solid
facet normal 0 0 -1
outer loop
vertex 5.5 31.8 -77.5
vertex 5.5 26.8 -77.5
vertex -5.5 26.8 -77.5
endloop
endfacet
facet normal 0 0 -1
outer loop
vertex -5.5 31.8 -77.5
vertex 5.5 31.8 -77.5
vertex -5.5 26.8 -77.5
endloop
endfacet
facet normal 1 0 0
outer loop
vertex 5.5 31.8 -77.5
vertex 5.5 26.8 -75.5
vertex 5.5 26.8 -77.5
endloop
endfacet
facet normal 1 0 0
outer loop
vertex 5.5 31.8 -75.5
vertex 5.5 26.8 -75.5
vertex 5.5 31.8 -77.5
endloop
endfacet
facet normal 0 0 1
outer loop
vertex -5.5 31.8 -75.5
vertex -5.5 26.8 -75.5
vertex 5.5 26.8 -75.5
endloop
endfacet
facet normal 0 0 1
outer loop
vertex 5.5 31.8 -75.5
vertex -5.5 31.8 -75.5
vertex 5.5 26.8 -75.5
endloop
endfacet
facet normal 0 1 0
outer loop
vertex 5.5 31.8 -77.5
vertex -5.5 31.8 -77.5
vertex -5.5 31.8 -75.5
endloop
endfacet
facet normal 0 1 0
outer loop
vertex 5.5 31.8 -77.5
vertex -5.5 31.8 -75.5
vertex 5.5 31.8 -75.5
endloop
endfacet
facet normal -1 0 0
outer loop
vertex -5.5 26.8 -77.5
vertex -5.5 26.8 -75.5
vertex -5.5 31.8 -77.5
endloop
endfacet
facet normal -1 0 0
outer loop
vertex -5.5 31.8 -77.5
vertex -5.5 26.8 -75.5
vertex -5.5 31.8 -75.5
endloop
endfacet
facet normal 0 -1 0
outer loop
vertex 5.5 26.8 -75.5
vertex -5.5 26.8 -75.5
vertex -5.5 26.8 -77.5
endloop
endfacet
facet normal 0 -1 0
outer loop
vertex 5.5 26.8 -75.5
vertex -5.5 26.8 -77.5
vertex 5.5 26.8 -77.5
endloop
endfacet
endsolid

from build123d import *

# Parameters (mm, degrees)
SKETCH1_W                       = 39
SKETCH1_H                       = 155
BOSS_EXTRUDE1_DEPTH             = 2
BOSS_EXTRUDE2_DEPTH             = 38
SKETCH3_W                       = 2
SKETCH3_H                       = 2
BOSS_EXTRUDE3_DEPTH             = 38
SKETCH4_W                       = 2
SKETCH4_H                       = 2
BOSS_EXTRUDE4_DEPTH             = 151
SKETCH6_W                       = 35
SKETCH6_H                       = 2.2
CUT_EXTRUDE1_DEPTH              = 160.340045186
SKETCH7_W                       = 35
SKETCH7_H                       = 2.2
CUT_EXTRUDE2_DEPTH              = 89.490112442
SKETCH5_W                       = 31
SKETCH5_H                       = 2
BOSS_EXTRUDE5_DEPTH             = 2
BOSS_EXTRUDE6_REACH             = 91.367
SKETCH8_W                       = 2
SKETCH8_H                       = 2
BOSS_EXTRUDE6_DIRECTION_2_REACH = 91.367
SKETCH10_W                      = 2
SKETCH10_H                      = 2.2
SKETCH10_W_2                    = 2.2
SKETCH10_H_2                    = 2
BOSS_EXTRUDE8_DEPTH             = 2
SKETCH11_W                      = 2
SKETCH11_H                      = 2.2
SKETCH11_W_2                    = 2.2
SKETCH11_H_2                    = 2
BOSS_EXTRUDE9_DEPTH             = 2
FILLET2_R                       = 2.5
SKETCH14_W                      = 36.5
SKETCH14_H                      = 7.75
BOSS_EXTRUDE10_DEPTH            = 2
SKETCH13_W                      = 31
SKETCH13_H                      = 3
CUT_EXTRUDE4_DEPTH              = 2
FILLET3_R                       = 2
FILLET4_R                       = 0.5
SKETCH15_R                      = 5.1
CUT_EXTRUDE5_DEPTH              = 90.367219941
SKETCH16_R                      = 7.1
BOSS_EXTRUDE11_DEPTH            = 1
FILLET5_R                       = 0.5
FILLET7_R                       = 0.5
CUT_EXTRUDE6_DEPTH              = 6
SKETCH18_W                      = 29
SKETCH18_H                      = 3
CUT_EXTRUDE8_DEPTH              = 90.367219986
CUT_EXTRUDE11_DEPTH             = 90.367219986
CUT_EXTRUDE11_DEPTH_BACK        = 90.367219986
SKETCH20_W                      = 5
SKETCH20_H                      = 40
SKETCH21_W                      = 9
SKETCH21_H                      = 31
CUT_EXTRUDE12_DEPTH             = 89.41097217
CUT_EXTRUDE13_DEPTH             = 41.425858061
CUT_EXTRUDE13_DEPTH_BACK        = 41.425858061
SKETCH22_W                      = 11
SKETCH22_H                      = 8.2
SKETCH23_W                      = 11
SKETCH23_H                      = 17.8
CUT_EXTRUDE14_DEPTH             = 33.334037793


with BuildPart() as part:
    # Sketch1 → Boss-Extrude1 (new body)
    with BuildSketch(Plane(origin=(0, 0, 0), x_dir=(1, 0, 0), z_dir=(0, 1, 0))):
        Rectangle(SKETCH1_W, SKETCH1_H)
    extrude(amount=BOSS_EXTRUDE1_DEPTH)

    # Sketch2 → Boss-Extrude2 (add)
    with BuildSketch(Plane(origin=(0, 2, 0), x_dir=(1, 0, 0), z_dir=(0, 1, 0))):
        Polygon((-17.5, -77.5), (-17.5, -75.5), (-17.5, 75.5), (17.5, 75.5), (17.5, -75.5), (17.5, -77.5), (19.5, -77.5), (19.5, 77.5), (-19.5, 77.5), (-19.5, -77.5), align=None)
    extrude(amount=BOSS_EXTRUDE2_DEPTH)

    # Sketch3 → Boss-Extrude3 (add)
    with BuildSketch(Plane(origin=(0, 2, 0), x_dir=(1, 0, 0), z_dir=(0, 1, 0))):
        with Locations((-16.5, -76.5)):
            Rectangle(SKETCH3_W, SKETCH3_H)
        with Locations((-16.5, -72.3)):
            Rectangle(SKETCH3_W, SKETCH3_H)
        with Locations((16.5, -76.5)):
            Rectangle(SKETCH3_W, SKETCH3_H)
        with Locations((16.5, -72.3)):
            Rectangle(SKETCH3_W, SKETCH3_H)
    extrude(amount=BOSS_EXTRUDE3_DEPTH)

    # Sketch4 → Boss-Extrude4 (add)
    with BuildSketch(Plane.XY.offset(-75.5)):
        with Locations((-16.5, 39)):
            Rectangle(SKETCH4_W, SKETCH4_H)
        Polygon((-15.5, 33.8), (-17.5, 31.8), (-17.5, 35.8), (-15.5, 35.8), align=None)
        Polygon((15.5, 35.8), (17.5, 35.8), (17.5, 31.8), (15.5, 33.8), align=None)
        with Locations((16.5, 39)):
            Rectangle(SKETCH4_W, SKETCH4_H)
    extrude(amount=BOSS_EXTRUDE4_DEPTH)

    # Sketch6 → Cut-Extrude1 (cut, through all)
    with BuildSketch(Plane.XY.offset(-75.5)):
        with Locations((0, 36.9)):
            Rectangle(SKETCH6_W, SKETCH6_H)
    extrude(amount=CUT_EXTRUDE1_DEPTH, mode=Mode.SUBTRACT)

    # Sketch7 → Cut-Extrude2 (cut, through all)
    with BuildSketch(Plane(origin=(0, 2, 0), x_dir=(1, 0, 0), z_dir=(0, 1, 0))):
        with Locations((0, -74.4)):
            Rectangle(SKETCH7_W, SKETCH7_H)
    extrude(amount=CUT_EXTRUDE2_DEPTH, mode=Mode.SUBTRACT)

    # Sketch5 → Boss-Extrude5 (add)
    with BuildSketch(Plane(origin=(0, 2, 0), x_dir=(1, 0, 0), z_dir=(0, 1, 0))):
        with Locations((0, -76.5)):
            Rectangle(SKETCH5_W, SKETCH5_H)
        with Locations((0, -72.3)):
            Rectangle(SKETCH5_W, SKETCH5_H)
    extrude(amount=BOSS_EXTRUDE5_DEPTH)

    # Boss-Extrude6: up to this face of the body (flat: up to its plane)
    boss_extrude6_end = Plane(part.part.faces().sort_by_distance((17.5, 16.9, -2.1))[0])
    # Sketch8 → Boss-Extrude6 (add, up to the picked face)
    with BuildSketch(Plane(origin=(0, 0, 0), x_dir=(0, 0, -1), z_dir=(1, 0, 0)), mode=Mode.PRIVATE) as boss_extrude6_sk1:
        with Locations((74.5, 39)):
            Rectangle(SKETCH8_W, SKETCH8_H)
    boss_extrude6_tool1 = split(extrude(boss_extrude6_sk1.sketch, amount=BOSS_EXTRUDE6_REACH, mode=Mode.PRIVATE), bisect_by=boss_extrude6_end, keep=Keep.BOTH, mode=Mode.PRIVATE)
    # Sketch8 → Boss-Extrude6 (add, up to the picked face)
    with BuildSketch(Plane(origin=(0, 0, 0), x_dir=(0, 0, -1), z_dir=(1, 0, 0)), mode=Mode.PRIVATE) as boss_extrude6_sk2:
        Polygon((75.5, 35.8), (73.5, 35.8), (73.5, 33.8), (75.5, 31.8), align=None)
    boss_extrude6_tool2 = split(extrude(boss_extrude6_sk2.sketch, amount=BOSS_EXTRUDE6_REACH, mode=Mode.PRIVATE), bisect_by=boss_extrude6_end, keep=Keep.BOTH, mode=Mode.PRIVATE)
    add(boss_extrude6_tool1.solids().sort_by(Axis((0, 39, -74.5), (1, 0, 0)))[0])
    add(boss_extrude6_tool2.solids().sort_by(Axis((0, 34.244444, -74.611111), (1, 0, 0)))[0])

    # Boss-Extrude6 direction 2: up to this face of the body (flat: up to its plane)
    boss_extrude6_direction_2_end = Plane(part.part.faces().sort_by_distance((-17.5, 16.9, -2.1))[0])
    # Sketch8 → Boss-Extrude6 direction 2 (add, up to the picked face)
    with BuildSketch(Plane(origin=(0, 0, 0), x_dir=(0, 0, -1), z_dir=(1, 0, 0)), mode=Mode.PRIVATE) as boss_extrude6_direction_2_sk1:
        with Locations((74.5, 39)):
            Rectangle(SKETCH8_W, SKETCH8_H)
    boss_extrude6_direction_2_tool1 = split(extrude(boss_extrude6_direction_2_sk1.sketch, amount=-BOSS_EXTRUDE6_DIRECTION_2_REACH, mode=Mode.PRIVATE), bisect_by=boss_extrude6_direction_2_end, keep=Keep.BOTH, mode=Mode.PRIVATE)
    # Sketch8 → Boss-Extrude6 direction 2 (add, up to the picked face)
    with BuildSketch(Plane(origin=(0, 0, 0), x_dir=(0, 0, -1), z_dir=(1, 0, 0)), mode=Mode.PRIVATE) as boss_extrude6_direction_2_sk2:
        Polygon((75.5, 35.8), (73.5, 35.8), (73.5, 33.8), (75.5, 31.8), align=None)
    boss_extrude6_direction_2_tool2 = split(extrude(boss_extrude6_direction_2_sk2.sketch, amount=-BOSS_EXTRUDE6_DIRECTION_2_REACH, mode=Mode.PRIVATE), bisect_by=boss_extrude6_direction_2_end, keep=Keep.BOTH, mode=Mode.PRIVATE)
    add(boss_extrude6_direction_2_tool1.solids().sort_by(Axis((0, 39, -74.5), (-1, 0, 0)))[0])
    add(boss_extrude6_direction_2_tool2.solids().sort_by(Axis((0, 34.244444, -74.611111), (-1, 0, 0)))[0])

    # Sketch10 → Boss-Extrude8 (add)
    with BuildSketch(Plane(origin=(-17.5, 0, 0), x_dir=(0, 0, -1), z_dir=(1, 0, 0))):
        with Locations((-76.5, 36.9)):
            Rectangle(SKETCH10_W, SKETCH10_H)
        with Locations((-74.4, 39)):
            Rectangle(SKETCH10_W_2, SKETCH10_H_2)
    extrude(amount=BOSS_EXTRUDE8_DEPTH)

    # Sketch11 → Boss-Extrude9 (add)
    with BuildSketch(Plane.ZY.offset(-17.5)):
        with Locations((76.5, 36.9)):
            Rectangle(SKETCH11_W, SKETCH11_H)
        with Locations((74.4, 39)):
            Rectangle(SKETCH11_W_2, SKETCH11_H_2)
    extrude(amount=BOSS_EXTRUDE9_DEPTH)

    # Fillet2
    fillet2_edges = [part.edges().sort_by_distance(p)[0] for p in [
        (-17.5, 16.9, 71.3),
        (17.5, 16.9, 71.3),
        (19.5, 20, 77.5),
        (-19.5, 20, 77.5),
        (-19.5, 20, -77.5),
        (-17.5, 16.9, -75.5),
        (17.5, 16.9, -75.5),
        (19.5, 20, -77.5),
        (19.5, 40, 0),
        (-19.5, 40, 0),
        (19.5, 0, 0),
        (-19.5, 0, 0),
        (0, 40, -77.5),
        (0, 0, 77.5),
        (0, 0, -77.5),
        (-17.5, 40, 77.5),
        (17.5, 40, 77.5),
    ]]
    fillet(fillet2_edges, radius=FILLET2_R)

    # Sketch14 → Boss-Extrude10 (add)
    with BuildSketch(Plane.XY.offset(-75.5)):
        with Locations((0, 5.125)):
            Rectangle(SKETCH14_W, SKETCH14_H)
    extrude(amount=BOSS_EXTRUDE10_DEPTH)

    # Sketch13 → Cut-Extrude4 (cut)
    with BuildSketch(Plane(origin=(0, 0, -77.5), x_dir=(-1, 0, 0), z_dir=(0, 0, -1))):
        with Locations((0, 5.5)):
            Rectangle(SKETCH13_W, SKETCH13_H)
    extrude(amount=-CUT_EXTRUDE4_DEPTH, mode=Mode.SUBTRACT)

    # Fillet3
    fillet3_edges = [part.edges().sort_by_distance(p)[0] for p in [
        (0, 9, -73.5),
    ]]
    fillet(fillet3_edges, radius=FILLET3_R - 0.0001)  # a hair under: the kernel refuses the full size

    # Fillet4
    fillet4_edges = [part.edges().sort_by_distance(p)[0] for p in [
        (15.5, 5.5, -75.5),
        (15.5, 4, -76.5),
        (0, 7, -75.5),
        (15.5, 7, -76.5),
        (-15.5, 5.5, -75.5),
        (-15.5, 7, -76.5),
        (0, 4, -75.5),
        (-15.5, 4, -76.5),
        (15.5, 5.5, -77.5),
        (0, 4, -77.5),
        (-15.5, 5.5, -77.5),
        (0, 7, -77.5),
    ]]
    fillet(fillet4_edges, radius=FILLET4_R)

    # Sketch15 → Cut-Extrude5 (cut, through all)
    with BuildSketch(Plane.XZ):
        with Locations(Location((0, 38.75, 0), (0, 0, 270))):
            Circle(SKETCH15_R)
        with Locations(Location((0, -38.75, 0), (0, 0, 270))):
            Circle(SKETCH15_R)
    extrude(amount=-CUT_EXTRUDE5_DEPTH, mode=Mode.SUBTRACT)

    # Sketch16 → Boss-Extrude11 (add)
    with BuildSketch(Plane(origin=(0, 2, 0), x_dir=(1, 0, 0), z_dir=(0, 1, 0))):
        with Locations(Location((0, 38.75, 0), (0, 0, 270))):
            Circle(SKETCH16_R)
        with Locations(Location((0, -38.75, 0), (0, 0, 270))):
            Circle(SKETCH16_R)
    extrude(amount=BOSS_EXTRUDE11_DEPTH)

    # Fillet5
    fillet5_edges = [part.edges().sort_by_distance(p)[0] for p in [
        (0, 2, -45.85),
        (0, 3, -45.85),
        (0, 2, 31.65),
        (0, 3, 31.65),
    ]]
    fillet(fillet5_edges, radius=FILLET5_R - 0.0001)  # a hair under: the kernel refuses the full size

    # Fillet7
    fillet7_edges = [part.edges().sort_by_distance(p)[0] for p in [
        (15.5, 40, 0.75),
        (0, 4, 77.5),
        (0, 40, -73.5),
        (-15.5, 40, 0.75),
        (-15.5, 20.75, 77.5),
        (-15.5, 39.267766953, 76.767766953),
        (15.5, 20.75, 77.5),
        (15.5, 39.267766953, 76.767766953),
    ]]
    fillet(fillet7_edges, radius=FILLET7_R)

    # Sketch17 → Cut-Extrude6 (cut)
    with BuildSketch(Plane.XZ):
        Polygon((-17, -77.5), (-17, 70.299999999), (-14.999999999, 71.3), (-14.999999999, 77.5), (14.999999999, 77.5), (14.999999999, 71.3), (17, 70.299999999), (17, -77.5), align=None)
    extrude(amount=-CUT_EXTRUDE6_DEPTH, mode=Mode.SUBTRACT)

    # Sketch18 → Cut-Extrude8 (cut, through all)
    with BuildSketch(Plane.XY):
        with Locations((0, 7.5)):
            Rectangle(SKETCH18_W, SKETCH18_H)
    extrude(amount=-CUT_EXTRUDE8_DEPTH, mode=Mode.SUBTRACT)

    # Sketch20 → Cut-Extrude11 (cut, two sides: drawn at the far end of the back side and taken through both)
    with BuildSketch(Plane.XY.offset(-CUT_EXTRUDE11_DEPTH_BACK)):
        Polygon((19.5, 40), (14.5, 40), (14.5, 6), (14.5, 0), (19.5, 0), align=None)
        with Locations((-17, 20)):
            Rectangle(SKETCH20_W, SKETCH20_H)
    extrude(amount=CUT_EXTRUDE11_DEPTH + CUT_EXTRUDE11_DEPTH_BACK, mode=Mode.SUBTRACT)

    # Sketch21 → Cut-Extrude12 (cut, through all)
    with BuildSketch(Plane.XY):
        with Locations((-10, 24.5)):
            Rectangle(SKETCH21_W, SKETCH21_H)
        with Locations((10, 24.5)):
            Rectangle(SKETCH21_W, SKETCH21_H)
    extrude(amount=-CUT_EXTRUDE12_DEPTH, mode=Mode.SUBTRACT)

    # Sketch22 → Cut-Extrude13 (cut, two sides: drawn at the far end of the back side and taken through both)
    with BuildSketch(Plane.XY.offset(-75.5).offset(-CUT_EXTRUDE13_DEPTH_BACK)):
        with Locations((0, 35.9)):
            Rectangle(SKETCH22_W, SKETCH22_H)
    extrude(amount=CUT_EXTRUDE13_DEPTH + CUT_EXTRUDE13_DEPTH_BACK, mode=Mode.SUBTRACT)

    # Sketch23 → Cut-Extrude14 (cut, through all)
    with BuildSketch(Plane.XY.offset(-75.5)):
        with Locations((0, 17.9)):
            Rectangle(SKETCH23_W, SKETCH23_H)
    extrude(amount=-CUT_EXTRUDE14_DEPTH, mode=Mode.SUBTRACT)


solid = part.part
